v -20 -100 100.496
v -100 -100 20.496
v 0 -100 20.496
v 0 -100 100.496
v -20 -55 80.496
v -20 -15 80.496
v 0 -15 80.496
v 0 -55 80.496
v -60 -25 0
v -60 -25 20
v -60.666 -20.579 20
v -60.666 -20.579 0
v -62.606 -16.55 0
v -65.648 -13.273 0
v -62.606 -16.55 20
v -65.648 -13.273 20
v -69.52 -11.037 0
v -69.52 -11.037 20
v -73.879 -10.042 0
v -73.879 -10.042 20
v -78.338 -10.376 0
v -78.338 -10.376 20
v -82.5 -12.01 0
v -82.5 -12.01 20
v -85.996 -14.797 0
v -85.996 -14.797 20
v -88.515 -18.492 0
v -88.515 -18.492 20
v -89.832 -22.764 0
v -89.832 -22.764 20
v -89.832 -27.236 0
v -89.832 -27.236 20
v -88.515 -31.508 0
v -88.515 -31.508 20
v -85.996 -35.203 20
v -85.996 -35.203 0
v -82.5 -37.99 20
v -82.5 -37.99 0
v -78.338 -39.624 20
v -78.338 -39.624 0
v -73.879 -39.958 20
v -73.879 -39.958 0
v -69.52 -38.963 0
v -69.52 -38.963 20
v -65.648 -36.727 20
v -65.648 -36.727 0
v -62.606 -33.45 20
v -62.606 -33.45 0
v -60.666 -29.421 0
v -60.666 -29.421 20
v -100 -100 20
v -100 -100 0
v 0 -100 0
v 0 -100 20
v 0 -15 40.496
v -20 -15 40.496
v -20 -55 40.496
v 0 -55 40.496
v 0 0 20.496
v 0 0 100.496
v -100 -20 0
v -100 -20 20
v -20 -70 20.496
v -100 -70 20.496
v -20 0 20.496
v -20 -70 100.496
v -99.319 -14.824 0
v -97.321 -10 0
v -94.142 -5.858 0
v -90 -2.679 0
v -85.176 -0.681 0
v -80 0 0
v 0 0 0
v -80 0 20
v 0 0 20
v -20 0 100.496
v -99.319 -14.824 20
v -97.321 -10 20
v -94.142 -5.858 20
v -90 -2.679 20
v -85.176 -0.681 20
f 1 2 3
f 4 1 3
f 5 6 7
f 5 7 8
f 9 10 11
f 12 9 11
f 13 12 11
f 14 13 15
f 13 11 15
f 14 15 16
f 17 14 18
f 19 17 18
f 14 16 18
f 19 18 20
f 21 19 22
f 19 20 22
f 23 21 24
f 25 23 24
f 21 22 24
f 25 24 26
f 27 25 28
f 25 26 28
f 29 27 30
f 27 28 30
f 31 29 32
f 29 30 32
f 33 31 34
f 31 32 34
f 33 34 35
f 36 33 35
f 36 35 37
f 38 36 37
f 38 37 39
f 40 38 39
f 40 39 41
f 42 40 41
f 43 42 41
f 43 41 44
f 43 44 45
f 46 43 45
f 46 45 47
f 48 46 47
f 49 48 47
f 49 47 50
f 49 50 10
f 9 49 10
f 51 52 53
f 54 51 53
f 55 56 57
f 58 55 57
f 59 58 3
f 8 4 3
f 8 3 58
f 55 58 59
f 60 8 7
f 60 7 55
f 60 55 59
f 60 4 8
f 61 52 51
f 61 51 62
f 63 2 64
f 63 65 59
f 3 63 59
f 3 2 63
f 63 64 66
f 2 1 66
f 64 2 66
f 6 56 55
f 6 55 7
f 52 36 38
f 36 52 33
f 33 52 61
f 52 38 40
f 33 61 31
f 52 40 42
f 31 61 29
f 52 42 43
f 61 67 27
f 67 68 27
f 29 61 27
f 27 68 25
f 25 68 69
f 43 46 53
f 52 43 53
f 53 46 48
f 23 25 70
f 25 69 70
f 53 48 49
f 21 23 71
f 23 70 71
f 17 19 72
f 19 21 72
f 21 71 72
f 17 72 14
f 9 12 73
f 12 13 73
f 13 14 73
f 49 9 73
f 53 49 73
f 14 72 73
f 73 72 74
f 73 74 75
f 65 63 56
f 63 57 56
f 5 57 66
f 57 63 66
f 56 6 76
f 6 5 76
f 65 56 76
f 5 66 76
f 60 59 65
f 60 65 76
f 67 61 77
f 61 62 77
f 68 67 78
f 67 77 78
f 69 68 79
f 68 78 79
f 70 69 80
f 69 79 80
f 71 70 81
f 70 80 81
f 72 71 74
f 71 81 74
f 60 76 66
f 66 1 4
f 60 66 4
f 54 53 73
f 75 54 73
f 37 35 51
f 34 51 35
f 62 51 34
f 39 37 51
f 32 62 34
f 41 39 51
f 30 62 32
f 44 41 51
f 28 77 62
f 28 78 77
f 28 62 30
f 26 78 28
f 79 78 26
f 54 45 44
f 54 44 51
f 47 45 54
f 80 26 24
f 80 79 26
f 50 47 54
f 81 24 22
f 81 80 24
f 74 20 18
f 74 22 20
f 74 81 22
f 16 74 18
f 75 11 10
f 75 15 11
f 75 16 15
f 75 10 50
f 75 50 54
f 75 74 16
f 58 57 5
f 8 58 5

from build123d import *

# Parameters (mm, degrees)
F0_W      = 100
F0_H      = 100
F1_DEPTH  = 20
F2_W      = 100
F2_H      = 80
F3_DEPTH  = 20
F4_R      = 15
F5_DEPTH  = 21
F6_W      = 80
F6_H      = 80
F7_DEPTH  = 30
F8_SIZE   = 79.99999
F9_W      = 40
F9_H      = 40
F10_DEPTH = 22
F11_R     = 20


# Not quite as in the source:
# - a fillet or chamfer is up to 0.001 mm smaller than in the source, because OpenCascade refuses the exact size


with BuildPart() as f1:
    # F0 (on Top) → F1 (new body)
    with BuildSketch(Plane.XY):
        with Locations((-50, -50)):
            Rectangle(F0_W, F0_H)
    extrude(amount=F1_DEPTH)

    # F4 (on face) → F5 (cut)
    with BuildSketch(Plane.XY.offset(20)):
        with Locations((-75, -25)):
            Circle(F4_R)
    extrude(amount=-F5_DEPTH, mode=Mode.SUBTRACT)

    # F11
    f11_edges = [f1.edges().sort_by_distance(p)[0] for p in [
        (-100, 0, 10),
    ]]
    fillet(f11_edges, radius=F11_R)


with BuildPart() as f3:
    # F2 (on Right) → F3 (new body)
    with BuildSketch(Plane.YZ):
        with Locations((-50, 60.4958688773)):
            Rectangle(F2_W, F2_H)
    extrude(amount=-F3_DEPTH)

    # F6 (on face) → F7 (join)
    with BuildSketch(Plane.XZ.offset(100)):
        with Locations((-60, 60.4958688773)):
            Rectangle(F6_W, F6_H)
    extrude(amount=-F7_DEPTH)

    # F8 (size 80 in the source; OpenCascade refuses exactly that, so slightly less here)
    f8_edges = [f3.edges().sort_by_distance(p)[0] for p in [
        (-100, -85, 100.495869),
    ]]
    chamfer(f8_edges, length=F8_SIZE)

    # F9 (on face) → F10 (cut)
    with BuildSketch(Plane(origin=(-20, 0, 0), x_dir=(0, -1, 0), z_dir=(-1, 0, 0))):
        with Locations((35, 60.4958688773)):
            Rectangle(F9_W, F9_H)
    extrude(amount=-F10_DEPTH, mode=Mode.SUBTRACT)


solid = Compound([f1.part, f3.part])
